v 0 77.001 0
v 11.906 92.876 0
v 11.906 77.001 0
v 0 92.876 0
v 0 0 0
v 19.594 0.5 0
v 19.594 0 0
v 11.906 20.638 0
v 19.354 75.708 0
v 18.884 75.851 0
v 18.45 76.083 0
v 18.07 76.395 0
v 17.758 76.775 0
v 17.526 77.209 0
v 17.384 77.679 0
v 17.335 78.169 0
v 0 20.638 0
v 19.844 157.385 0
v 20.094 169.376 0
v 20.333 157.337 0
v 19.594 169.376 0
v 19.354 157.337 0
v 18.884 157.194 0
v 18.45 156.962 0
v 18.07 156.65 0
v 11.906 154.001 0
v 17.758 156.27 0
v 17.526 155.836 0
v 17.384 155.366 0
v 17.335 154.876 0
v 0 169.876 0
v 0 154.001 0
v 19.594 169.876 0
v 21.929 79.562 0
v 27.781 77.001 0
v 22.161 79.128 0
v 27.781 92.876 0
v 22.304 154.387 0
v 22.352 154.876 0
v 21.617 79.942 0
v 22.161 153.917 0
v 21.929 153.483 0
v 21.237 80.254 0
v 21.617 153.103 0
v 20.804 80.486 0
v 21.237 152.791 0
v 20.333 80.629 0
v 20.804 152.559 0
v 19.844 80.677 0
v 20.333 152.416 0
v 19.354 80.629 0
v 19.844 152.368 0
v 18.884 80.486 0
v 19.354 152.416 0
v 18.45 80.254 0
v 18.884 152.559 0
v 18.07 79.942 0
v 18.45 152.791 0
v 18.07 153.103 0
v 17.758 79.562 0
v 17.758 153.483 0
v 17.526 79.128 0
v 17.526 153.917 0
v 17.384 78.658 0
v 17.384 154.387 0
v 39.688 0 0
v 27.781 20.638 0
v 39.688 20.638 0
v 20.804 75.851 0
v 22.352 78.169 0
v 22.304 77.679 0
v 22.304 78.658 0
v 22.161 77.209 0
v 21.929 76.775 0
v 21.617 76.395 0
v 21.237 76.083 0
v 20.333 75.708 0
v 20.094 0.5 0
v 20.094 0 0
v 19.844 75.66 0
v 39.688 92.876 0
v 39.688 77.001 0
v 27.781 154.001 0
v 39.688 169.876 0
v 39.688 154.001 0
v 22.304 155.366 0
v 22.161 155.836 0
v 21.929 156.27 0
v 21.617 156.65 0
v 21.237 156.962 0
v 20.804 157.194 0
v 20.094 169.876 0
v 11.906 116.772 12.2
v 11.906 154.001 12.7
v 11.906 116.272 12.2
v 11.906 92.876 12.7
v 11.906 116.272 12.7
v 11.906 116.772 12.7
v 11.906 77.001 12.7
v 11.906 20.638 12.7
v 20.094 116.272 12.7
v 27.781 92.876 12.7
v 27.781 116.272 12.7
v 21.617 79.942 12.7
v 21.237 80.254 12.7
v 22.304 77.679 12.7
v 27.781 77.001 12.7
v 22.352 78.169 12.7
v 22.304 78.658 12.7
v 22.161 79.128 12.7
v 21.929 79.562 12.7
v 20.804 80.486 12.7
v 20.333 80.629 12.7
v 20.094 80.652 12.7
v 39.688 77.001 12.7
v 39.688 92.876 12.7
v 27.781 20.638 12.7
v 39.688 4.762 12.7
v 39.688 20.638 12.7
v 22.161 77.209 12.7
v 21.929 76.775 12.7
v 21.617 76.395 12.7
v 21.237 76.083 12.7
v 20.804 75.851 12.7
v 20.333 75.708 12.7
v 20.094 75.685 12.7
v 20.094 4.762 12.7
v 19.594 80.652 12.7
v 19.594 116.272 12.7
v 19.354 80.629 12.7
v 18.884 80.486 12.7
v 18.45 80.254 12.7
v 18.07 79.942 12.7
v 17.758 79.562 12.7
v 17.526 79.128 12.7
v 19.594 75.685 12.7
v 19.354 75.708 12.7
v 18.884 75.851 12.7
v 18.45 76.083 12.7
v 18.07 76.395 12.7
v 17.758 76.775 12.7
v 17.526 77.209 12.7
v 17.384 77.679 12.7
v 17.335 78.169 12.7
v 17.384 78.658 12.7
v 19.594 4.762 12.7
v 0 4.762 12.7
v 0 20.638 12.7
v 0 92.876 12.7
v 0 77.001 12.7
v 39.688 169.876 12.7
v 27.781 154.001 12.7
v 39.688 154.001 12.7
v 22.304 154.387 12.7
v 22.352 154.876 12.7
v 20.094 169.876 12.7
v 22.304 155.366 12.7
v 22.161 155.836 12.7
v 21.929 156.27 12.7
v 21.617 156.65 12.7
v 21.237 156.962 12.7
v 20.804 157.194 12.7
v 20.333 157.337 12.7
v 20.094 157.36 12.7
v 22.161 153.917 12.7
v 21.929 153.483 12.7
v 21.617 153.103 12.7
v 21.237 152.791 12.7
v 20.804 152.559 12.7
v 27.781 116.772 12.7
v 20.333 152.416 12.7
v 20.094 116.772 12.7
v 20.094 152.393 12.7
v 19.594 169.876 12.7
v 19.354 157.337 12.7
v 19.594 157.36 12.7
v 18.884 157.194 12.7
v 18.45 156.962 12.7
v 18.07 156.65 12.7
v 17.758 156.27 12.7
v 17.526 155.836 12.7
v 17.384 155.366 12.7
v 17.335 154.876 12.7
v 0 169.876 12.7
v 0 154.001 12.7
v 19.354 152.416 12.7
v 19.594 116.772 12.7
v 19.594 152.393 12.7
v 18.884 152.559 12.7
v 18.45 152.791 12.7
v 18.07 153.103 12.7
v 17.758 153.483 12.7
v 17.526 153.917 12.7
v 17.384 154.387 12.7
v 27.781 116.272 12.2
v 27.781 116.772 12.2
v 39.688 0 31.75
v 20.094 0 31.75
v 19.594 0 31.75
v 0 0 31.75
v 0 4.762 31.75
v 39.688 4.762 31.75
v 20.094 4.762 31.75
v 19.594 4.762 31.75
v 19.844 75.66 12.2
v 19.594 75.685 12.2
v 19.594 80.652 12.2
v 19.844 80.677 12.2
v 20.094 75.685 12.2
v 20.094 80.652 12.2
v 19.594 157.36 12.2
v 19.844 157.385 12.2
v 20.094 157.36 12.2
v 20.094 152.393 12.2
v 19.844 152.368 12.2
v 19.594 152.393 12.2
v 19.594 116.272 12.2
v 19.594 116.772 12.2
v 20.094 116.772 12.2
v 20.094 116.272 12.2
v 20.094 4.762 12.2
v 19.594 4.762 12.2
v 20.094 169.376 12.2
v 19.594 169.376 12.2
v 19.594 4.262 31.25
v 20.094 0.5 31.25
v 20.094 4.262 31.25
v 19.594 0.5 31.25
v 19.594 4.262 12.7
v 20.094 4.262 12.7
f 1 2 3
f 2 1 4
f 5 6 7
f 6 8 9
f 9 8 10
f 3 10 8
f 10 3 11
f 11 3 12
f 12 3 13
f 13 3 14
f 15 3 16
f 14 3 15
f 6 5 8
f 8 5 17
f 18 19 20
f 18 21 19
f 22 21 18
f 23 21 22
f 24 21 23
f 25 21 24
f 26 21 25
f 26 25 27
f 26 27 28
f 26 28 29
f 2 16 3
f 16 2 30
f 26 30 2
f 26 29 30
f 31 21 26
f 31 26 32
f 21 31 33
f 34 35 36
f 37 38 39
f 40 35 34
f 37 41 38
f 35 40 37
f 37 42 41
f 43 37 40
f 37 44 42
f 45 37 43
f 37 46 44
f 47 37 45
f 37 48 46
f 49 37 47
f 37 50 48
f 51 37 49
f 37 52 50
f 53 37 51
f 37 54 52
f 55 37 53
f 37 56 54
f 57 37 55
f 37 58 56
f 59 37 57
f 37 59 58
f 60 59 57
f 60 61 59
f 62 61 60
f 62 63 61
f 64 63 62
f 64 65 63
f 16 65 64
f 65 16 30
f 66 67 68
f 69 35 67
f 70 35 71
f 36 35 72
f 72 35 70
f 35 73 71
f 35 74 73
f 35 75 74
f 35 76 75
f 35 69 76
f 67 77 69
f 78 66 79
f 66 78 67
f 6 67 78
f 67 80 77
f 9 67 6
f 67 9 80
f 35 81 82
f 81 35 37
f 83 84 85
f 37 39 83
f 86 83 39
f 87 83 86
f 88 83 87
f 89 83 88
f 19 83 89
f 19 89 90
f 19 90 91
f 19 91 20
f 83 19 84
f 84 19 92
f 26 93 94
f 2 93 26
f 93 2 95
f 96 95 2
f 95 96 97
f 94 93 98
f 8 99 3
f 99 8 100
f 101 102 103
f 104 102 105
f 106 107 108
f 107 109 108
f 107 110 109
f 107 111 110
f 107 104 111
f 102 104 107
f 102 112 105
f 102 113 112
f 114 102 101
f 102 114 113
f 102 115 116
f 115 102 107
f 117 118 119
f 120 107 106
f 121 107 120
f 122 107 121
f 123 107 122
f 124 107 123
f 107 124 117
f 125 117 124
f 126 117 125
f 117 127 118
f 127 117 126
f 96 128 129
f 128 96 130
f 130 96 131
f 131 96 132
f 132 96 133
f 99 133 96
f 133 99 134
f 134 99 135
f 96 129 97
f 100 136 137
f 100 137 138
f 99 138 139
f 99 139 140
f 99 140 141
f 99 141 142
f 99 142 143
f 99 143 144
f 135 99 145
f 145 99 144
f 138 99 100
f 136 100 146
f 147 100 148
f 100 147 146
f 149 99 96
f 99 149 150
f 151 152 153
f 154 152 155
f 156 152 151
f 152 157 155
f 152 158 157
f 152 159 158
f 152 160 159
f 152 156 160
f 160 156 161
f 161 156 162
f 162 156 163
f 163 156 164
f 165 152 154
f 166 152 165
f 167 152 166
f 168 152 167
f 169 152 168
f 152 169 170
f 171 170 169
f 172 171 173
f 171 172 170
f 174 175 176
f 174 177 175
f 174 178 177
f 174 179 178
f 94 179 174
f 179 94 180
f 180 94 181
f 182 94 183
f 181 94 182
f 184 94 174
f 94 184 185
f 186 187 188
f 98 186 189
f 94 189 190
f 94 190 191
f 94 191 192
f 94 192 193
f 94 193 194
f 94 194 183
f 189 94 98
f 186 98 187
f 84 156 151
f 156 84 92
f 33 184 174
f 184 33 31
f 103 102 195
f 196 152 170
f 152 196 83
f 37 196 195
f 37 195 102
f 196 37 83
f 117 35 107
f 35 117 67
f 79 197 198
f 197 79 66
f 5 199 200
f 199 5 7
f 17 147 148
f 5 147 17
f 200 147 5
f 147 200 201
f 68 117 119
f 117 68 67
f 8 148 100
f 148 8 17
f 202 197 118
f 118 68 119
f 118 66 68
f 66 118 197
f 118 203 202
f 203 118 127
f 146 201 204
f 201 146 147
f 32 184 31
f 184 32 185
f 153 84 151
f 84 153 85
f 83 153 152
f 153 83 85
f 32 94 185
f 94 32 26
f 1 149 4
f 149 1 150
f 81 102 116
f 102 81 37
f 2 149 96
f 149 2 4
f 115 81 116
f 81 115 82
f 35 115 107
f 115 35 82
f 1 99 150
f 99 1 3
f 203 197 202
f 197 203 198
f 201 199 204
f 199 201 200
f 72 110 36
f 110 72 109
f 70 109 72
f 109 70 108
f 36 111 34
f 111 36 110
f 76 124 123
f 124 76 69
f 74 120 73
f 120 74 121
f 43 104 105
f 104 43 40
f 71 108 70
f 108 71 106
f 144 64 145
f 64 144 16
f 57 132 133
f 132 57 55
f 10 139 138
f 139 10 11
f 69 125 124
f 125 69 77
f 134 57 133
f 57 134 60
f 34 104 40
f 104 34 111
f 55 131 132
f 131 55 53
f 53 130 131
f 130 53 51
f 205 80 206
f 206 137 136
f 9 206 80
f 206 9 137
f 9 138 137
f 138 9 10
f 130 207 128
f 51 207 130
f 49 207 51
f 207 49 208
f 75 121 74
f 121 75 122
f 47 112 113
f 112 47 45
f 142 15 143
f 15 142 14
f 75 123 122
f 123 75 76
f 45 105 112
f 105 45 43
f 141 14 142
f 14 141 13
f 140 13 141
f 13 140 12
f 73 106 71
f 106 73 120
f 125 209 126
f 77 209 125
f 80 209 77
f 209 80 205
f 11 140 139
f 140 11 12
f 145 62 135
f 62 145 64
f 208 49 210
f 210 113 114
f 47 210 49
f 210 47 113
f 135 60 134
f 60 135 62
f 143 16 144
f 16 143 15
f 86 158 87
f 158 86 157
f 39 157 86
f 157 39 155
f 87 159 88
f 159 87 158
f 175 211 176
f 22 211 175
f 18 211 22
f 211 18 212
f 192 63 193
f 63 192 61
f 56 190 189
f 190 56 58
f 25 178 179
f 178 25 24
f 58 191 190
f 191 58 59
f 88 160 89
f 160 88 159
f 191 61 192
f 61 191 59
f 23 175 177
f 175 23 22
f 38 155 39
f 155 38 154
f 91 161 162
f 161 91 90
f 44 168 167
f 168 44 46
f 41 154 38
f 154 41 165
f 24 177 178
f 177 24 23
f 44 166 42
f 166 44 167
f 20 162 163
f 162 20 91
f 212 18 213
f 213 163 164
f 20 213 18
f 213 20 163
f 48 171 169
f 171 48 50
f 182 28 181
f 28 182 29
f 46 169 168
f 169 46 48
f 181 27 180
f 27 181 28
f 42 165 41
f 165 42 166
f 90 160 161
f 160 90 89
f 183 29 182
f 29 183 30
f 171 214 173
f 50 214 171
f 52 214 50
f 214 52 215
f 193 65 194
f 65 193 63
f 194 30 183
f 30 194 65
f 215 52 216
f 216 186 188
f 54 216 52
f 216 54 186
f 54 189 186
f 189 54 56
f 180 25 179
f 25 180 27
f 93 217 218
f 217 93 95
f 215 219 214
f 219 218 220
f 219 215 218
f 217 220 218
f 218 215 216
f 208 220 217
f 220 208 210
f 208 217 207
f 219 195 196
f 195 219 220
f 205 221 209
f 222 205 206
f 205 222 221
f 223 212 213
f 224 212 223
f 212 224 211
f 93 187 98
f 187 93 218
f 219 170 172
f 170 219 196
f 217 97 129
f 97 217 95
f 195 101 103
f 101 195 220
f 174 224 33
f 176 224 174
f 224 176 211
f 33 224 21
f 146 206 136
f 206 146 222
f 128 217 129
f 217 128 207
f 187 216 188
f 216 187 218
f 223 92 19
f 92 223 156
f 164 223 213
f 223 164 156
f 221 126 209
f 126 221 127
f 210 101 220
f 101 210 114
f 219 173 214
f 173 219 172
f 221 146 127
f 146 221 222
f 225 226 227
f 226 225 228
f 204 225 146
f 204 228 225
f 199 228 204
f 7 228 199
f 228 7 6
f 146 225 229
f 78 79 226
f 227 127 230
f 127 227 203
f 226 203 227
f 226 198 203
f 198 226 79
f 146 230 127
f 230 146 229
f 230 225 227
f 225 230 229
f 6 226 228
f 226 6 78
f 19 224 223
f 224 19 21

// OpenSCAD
//Changelog:
//v1.2 Reduced thickness to 1/8" to speed up print time and added drill guides
//V1.1 Fixed bug where Customizer wouldn't render correctly with default values.

$fa=6*1;
$fs=0.5*1;

// Stile Width (in inches)
x_in=1.5625;

// Bottom Hole (in inches)
y_in=2.89; //2.875

// Plate Thickness (in inches)
z_in=0.5;

// Lip Thickness (in inches)
lip_in=0.1875;

// Hole Diameter (in inches)
d_in=0.1975; //0.1975 fits 3/16" drill bit well

// Center to Center in inches
CTC_in=3.02;

// Width of center rail
a_in=0.625;

mm_per_inch=25.4*1;
x_mm = x_in*mm_per_inch; 
y_mm = y_in*mm_per_inch; 
z_mm = z_in*mm_per_inch; 
lip_mm = lip_in*mm_per_inch; 
d_mm = d_in*mm_per_inch; 
CTC_mm = CTC_in*mm_per_inch; 
a_mm = a_in*mm_per_inch;
//total_height=(CTC+1+z_in)*mm_per_inch;
difference()
{
    union() {
    
    // build center rail
    linear_extrude(z_mm) 
    translate([(x_mm/2)-(a_mm/2),0,0])   
    square([a_mm, (lip_mm+y_mm+CTC_mm+15)]);    
    
    // build crossbeams
    linear_extrude(z_mm) 
    translate([0,lip_mm,0])   
    square([x_mm, a_mm]);
        
    linear_extrude(z_mm) 
    translate([0,lip_mm+y_mm+CTC_mm+15-a_mm,0])   
    square([x_mm, a_mm]);
        
    linear_extrude(z_mm) 
    translate([0,((lip_mm+y_mm+CTC_mm+15)/2)-(a_mm/2),0])   
    square([x_mm, a_mm]);    
        
    // build main plate
    //linear_extrude(z_mm) 
    //square([x_mm, (lip_mm+y_mm+CTC_mm+15)]);

    // build lip
    //translate([0,0,z_mm]) 
    linear_extrude((0.75*mm_per_inch)+z_mm) 
    square([x_mm, (lip_mm)]);
    }

    // Drill bottom hole
    translate ([(x_mm/2), (lip_mm+y_mm), 0])
    cylinder(h=z_mm*4, d=d_mm, center=true);


    // Drill top hole
    translate ([(x_mm/2), (lip_mm+y_mm+CTC_mm), 0])
    cylinder(h=z_mm*4, d=d_mm, center=true);
    
    // Draw Centerline Mark #1
    translate ([0, lip_mm+y_mm+(CTC_mm/2)-(0.5/2), z_mm-0.5])
    linear_extrude(0.5)
    square([x_mm, 0.5]);

    // Draw Centerline Mark #2
    translate ([(x_mm/2)-(0.5/2), lip_mm, z_mm-0.5])
    linear_extrude(0.5)
    square([0.5,(y_mm+CTC_mm+15)]);
    
    // Draw Centerline Mark #3
    translate ([(x_mm/2)-(0.5/2), 0, (0.75*mm_per_inch)+z_mm-0.5])
    linear_extrude(0.5)
    square([0.5,(lip_mm)]);
    
    // Draw Centerline Mark #4
    translate ([(x_mm/2)-(0.5/2), lip_mm-0.5, z_mm])
    linear_extrude((0.75*mm_per_inch))
    square([0.5,0.5]);
    
    // Draw Centerline Mark #5
    translate ([(x_mm/2)-(0.5/2), 0, 0])
    linear_extrude(z_mm+(0.75*mm_per_inch))
    square([0.5,0.5]);
    
    // Draw Centerline Mark #6
    translate ([(x_mm/2)-(0.5/2), lip_mm+y_mm+CTC_mm+15-0.5, 0])
    linear_extrude(z_mm)
    square([0.5,0.5]);
}
